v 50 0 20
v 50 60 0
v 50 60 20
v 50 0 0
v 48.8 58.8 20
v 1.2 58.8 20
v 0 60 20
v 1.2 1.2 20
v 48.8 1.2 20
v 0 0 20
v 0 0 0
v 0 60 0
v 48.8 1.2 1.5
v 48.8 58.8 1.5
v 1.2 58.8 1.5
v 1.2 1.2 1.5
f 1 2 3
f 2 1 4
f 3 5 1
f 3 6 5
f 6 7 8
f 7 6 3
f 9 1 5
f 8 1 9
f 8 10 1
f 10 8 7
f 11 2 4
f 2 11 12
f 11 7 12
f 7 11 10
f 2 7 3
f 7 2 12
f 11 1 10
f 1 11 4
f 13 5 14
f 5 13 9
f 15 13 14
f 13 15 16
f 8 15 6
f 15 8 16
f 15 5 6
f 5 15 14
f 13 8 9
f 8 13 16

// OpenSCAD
$fn = 32;

// ----------------------------------------------------------------------
// Open box: 1.2 mm walls
// ----------------------------------------------------------------------

// --- parameters (mm) ---
box_l = 50;               // outer length, X
box_w = 60;               // outer width, Y
box_h = 20;               // outer height, Z
wall = 1.2;               // wall thickness
floor = 1.5;              // floor thickness
fit_tol = 0.1;            // tolerance for press fits, mm
free_tol = 0.3;           // tolerance for clearance fits, mm

difference() {
  cube([box_l, box_w, box_h]);
  translate([wall, wall, floor])
    cube([box_l - 2 * wall, box_w - 2 * wall, box_h]);
}
